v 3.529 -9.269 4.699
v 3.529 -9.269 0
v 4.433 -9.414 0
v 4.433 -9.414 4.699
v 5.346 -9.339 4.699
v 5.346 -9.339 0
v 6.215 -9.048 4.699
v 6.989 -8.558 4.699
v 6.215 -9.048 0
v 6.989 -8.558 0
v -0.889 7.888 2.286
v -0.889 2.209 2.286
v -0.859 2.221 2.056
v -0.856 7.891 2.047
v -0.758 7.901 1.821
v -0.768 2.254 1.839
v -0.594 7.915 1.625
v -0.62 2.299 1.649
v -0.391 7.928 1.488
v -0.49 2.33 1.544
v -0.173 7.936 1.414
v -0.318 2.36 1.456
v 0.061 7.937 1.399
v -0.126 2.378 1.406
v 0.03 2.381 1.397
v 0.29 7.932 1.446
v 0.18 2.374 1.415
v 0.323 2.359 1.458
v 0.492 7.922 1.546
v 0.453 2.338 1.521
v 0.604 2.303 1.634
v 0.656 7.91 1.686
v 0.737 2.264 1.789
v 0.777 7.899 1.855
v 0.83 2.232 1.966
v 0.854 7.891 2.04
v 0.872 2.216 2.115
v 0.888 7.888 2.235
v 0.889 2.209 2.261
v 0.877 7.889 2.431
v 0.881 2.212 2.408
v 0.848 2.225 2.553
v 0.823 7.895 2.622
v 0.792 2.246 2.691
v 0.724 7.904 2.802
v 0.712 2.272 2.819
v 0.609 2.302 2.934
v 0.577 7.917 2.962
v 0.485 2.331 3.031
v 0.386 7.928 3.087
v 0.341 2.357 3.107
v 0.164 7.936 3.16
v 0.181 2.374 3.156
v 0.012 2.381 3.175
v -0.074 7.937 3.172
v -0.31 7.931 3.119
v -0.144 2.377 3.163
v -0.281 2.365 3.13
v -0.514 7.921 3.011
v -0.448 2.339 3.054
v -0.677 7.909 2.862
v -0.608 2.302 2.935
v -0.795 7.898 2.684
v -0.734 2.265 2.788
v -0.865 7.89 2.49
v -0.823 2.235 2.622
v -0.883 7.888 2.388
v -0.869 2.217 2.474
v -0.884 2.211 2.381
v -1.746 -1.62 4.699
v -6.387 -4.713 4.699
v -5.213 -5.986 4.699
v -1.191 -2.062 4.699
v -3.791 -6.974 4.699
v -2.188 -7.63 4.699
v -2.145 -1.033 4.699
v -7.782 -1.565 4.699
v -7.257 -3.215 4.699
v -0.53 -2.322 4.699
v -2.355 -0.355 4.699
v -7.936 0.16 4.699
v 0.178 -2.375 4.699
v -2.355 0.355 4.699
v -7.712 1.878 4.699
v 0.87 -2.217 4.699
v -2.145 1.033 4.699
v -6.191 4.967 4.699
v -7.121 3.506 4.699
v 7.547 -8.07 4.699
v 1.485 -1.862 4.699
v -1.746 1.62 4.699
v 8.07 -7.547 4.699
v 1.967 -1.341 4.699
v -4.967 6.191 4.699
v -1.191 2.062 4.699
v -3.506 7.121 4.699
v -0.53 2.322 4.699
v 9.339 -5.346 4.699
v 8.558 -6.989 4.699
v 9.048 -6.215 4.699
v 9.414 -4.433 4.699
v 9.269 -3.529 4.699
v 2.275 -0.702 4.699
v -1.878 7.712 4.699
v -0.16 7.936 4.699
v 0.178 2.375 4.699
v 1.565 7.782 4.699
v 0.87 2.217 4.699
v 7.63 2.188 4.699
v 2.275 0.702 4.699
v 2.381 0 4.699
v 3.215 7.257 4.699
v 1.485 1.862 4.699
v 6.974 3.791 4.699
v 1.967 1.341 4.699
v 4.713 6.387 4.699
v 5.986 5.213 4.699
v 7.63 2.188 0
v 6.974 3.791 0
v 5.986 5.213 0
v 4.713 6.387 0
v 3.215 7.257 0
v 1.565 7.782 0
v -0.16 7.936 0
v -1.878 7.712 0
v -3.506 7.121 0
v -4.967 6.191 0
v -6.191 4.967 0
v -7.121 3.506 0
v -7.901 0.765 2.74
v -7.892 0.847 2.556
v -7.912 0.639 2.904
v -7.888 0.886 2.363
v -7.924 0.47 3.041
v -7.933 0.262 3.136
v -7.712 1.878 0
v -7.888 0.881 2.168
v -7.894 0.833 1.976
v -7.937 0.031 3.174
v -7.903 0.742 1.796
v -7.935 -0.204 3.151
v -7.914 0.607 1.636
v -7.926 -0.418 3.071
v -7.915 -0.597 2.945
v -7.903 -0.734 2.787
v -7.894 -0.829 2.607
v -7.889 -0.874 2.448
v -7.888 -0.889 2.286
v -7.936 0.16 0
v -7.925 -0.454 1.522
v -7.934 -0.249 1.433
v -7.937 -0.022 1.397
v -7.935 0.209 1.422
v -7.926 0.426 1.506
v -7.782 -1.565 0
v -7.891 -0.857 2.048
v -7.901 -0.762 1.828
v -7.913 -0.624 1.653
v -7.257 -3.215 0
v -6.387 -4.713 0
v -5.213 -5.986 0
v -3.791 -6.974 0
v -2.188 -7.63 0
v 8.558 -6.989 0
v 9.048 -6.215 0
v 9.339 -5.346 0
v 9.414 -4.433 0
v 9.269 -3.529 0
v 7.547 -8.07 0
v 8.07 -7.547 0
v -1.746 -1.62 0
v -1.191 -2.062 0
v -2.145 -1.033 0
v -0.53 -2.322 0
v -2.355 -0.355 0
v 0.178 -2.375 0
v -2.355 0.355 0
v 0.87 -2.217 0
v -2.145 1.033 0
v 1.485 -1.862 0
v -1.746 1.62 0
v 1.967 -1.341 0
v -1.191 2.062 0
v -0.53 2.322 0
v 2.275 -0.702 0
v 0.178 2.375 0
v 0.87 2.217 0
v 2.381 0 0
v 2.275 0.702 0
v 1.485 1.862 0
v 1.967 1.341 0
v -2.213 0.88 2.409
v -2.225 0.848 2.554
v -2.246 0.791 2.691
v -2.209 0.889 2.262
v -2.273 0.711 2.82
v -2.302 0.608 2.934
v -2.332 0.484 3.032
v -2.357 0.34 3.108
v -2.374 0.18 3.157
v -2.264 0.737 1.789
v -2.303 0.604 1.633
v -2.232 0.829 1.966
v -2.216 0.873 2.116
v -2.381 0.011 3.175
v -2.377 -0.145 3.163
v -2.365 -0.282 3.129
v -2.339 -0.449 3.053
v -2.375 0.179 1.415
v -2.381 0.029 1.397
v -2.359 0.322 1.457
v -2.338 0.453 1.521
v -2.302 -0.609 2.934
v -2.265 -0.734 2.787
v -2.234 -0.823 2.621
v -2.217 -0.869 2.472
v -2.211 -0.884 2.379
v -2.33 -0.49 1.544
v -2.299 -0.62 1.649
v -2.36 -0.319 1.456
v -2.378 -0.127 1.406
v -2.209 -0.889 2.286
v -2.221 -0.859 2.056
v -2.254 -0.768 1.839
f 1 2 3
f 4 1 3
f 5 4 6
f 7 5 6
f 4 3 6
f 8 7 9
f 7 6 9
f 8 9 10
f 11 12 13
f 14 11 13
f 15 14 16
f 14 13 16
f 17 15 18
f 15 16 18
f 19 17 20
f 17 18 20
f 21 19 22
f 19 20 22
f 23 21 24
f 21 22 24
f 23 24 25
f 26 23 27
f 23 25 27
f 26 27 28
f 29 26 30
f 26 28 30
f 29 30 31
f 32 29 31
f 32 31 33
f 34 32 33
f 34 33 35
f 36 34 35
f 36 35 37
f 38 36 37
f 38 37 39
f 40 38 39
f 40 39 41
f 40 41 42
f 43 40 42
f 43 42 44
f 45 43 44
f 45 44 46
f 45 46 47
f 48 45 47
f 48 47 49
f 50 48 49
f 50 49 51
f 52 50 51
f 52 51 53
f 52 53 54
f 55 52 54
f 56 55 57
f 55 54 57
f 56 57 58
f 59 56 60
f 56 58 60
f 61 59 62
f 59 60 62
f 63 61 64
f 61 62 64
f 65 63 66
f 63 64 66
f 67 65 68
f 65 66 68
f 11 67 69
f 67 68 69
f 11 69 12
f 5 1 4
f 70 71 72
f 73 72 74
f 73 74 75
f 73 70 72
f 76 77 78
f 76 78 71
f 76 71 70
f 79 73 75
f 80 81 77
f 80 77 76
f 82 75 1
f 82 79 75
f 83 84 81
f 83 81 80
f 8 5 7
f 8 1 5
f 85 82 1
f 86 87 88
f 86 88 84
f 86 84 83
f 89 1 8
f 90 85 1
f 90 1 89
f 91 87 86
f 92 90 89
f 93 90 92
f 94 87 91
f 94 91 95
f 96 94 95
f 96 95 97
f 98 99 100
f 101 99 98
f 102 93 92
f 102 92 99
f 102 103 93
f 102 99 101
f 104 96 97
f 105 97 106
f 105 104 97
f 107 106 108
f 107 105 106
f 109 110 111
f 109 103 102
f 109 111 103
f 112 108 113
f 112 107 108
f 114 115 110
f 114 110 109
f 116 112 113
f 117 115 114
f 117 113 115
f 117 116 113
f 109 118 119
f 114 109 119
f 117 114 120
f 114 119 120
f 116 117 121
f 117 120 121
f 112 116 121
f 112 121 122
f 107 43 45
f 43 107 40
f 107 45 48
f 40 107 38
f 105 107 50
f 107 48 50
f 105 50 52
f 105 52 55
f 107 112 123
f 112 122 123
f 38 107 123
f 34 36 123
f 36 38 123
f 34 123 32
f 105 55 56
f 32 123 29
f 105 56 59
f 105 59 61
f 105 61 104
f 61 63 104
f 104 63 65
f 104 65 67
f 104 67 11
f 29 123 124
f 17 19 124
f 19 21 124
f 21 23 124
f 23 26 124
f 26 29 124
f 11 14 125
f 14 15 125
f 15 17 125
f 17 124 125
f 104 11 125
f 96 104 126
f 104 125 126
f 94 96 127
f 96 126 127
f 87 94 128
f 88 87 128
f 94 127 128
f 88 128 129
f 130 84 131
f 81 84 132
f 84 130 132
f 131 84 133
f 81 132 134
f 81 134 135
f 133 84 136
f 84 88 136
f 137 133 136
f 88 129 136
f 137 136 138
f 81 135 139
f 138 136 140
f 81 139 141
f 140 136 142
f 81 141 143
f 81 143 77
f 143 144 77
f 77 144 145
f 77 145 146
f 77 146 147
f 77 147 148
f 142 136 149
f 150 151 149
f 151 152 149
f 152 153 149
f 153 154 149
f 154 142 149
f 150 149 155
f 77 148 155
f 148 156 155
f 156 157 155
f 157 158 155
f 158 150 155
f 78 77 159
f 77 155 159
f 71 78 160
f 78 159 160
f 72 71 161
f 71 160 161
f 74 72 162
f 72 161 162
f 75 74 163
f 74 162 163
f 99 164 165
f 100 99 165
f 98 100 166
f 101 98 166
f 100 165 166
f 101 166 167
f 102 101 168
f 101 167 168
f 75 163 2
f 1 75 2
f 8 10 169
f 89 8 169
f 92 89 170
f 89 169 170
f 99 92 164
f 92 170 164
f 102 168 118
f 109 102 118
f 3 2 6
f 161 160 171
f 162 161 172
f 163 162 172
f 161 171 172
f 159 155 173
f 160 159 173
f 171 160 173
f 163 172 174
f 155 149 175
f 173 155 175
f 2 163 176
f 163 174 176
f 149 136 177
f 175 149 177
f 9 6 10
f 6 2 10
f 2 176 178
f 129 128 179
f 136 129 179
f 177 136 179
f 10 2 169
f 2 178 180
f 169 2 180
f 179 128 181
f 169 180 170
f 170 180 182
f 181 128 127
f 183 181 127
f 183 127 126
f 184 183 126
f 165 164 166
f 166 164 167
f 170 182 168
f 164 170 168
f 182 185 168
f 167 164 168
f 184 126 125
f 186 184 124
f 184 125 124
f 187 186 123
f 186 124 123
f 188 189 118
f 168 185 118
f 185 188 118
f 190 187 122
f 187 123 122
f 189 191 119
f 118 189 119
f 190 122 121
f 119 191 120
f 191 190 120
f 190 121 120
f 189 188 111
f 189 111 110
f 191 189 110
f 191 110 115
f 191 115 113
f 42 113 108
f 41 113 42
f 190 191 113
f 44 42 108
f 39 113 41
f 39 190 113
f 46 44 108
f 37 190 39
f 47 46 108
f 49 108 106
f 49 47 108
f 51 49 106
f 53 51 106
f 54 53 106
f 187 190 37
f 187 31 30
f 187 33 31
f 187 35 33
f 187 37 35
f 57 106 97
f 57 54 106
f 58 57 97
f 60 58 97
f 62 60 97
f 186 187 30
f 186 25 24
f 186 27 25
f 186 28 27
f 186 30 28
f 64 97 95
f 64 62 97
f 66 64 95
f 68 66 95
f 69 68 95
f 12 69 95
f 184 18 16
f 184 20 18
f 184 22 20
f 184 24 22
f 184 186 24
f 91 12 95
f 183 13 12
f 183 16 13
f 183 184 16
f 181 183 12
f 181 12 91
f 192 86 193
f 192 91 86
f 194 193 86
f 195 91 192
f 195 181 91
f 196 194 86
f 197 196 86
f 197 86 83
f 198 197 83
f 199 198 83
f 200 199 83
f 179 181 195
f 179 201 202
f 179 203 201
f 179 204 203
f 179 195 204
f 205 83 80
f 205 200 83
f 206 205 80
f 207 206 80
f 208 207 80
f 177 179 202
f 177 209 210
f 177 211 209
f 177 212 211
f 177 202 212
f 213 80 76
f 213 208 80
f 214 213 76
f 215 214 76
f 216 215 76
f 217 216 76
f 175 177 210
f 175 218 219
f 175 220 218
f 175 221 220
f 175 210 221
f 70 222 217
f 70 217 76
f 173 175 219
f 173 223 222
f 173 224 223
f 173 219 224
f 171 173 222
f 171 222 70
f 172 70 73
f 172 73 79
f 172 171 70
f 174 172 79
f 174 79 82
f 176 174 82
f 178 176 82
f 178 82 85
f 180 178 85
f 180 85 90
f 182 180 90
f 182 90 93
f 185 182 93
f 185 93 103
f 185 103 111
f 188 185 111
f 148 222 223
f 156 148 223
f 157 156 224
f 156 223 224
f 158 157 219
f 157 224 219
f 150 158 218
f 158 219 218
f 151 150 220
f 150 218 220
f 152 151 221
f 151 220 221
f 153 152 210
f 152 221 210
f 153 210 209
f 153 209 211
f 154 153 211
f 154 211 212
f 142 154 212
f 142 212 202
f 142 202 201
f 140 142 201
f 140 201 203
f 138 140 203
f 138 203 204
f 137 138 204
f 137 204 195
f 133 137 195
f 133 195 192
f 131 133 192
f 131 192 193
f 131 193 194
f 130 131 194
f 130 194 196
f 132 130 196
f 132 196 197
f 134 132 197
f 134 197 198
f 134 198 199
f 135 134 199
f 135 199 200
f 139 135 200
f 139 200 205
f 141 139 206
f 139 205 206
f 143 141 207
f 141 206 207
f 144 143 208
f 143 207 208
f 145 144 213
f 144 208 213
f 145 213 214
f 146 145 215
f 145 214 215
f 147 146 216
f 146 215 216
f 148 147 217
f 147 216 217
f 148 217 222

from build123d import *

# Parameters (mm, degrees)
F0_R     = 2.38125
F1_DEPTH = 4.699
F4_D     = 1.778
F4_DEPTH = 8.4790642857
F4_START = 0.3420412
F4_TIP   = 0.5341650903
F7_D     = 1.778
F7_DEPTH = 8.4836
F7_START = 1.0024412
F7_TIP   = 0.5341650903


with BuildPart() as f1:
    # F0 (on Top) → F1 (new body)
    with BuildSketch(Plane.XY):
        with BuildLine():
            Line((9.2692313585, -3.5287562996), (7.6300147115, 2.1878715118))
            ThreePointArc((7.6300147115, 2.1878715118), (-5.6126600757, 5.6126600757), (-2.1878715118, -7.6300147115))
            Line((-2.1878715118, -7.6300147115), (3.5287562996, -9.2692313585))
            ThreePointArc((3.5287562996, -9.2692313585), (5.346264103, -9.3387548259), (6.9889002175, -8.5577844533))
            ThreePointArc((6.9889002175, -8.5577844533), (7.8128228253, -7.8128228253), (8.5577844533, -6.9889002175))
            ThreePointArc((8.5577844533, -6.9889002175), (9.3387548259, -5.346264103), (9.2692313585, -3.5287562996))
        make_face()
        Circle(F0_R, mode=Mode.SUBTRACT)
    extrude(amount=F1_DEPTH)

    # F4
    # its depths count from where the whole tool has entered the part; down to there all is cleared
    with Locations(Plane(origin=(-8.2296, 0, 0), x_dir=(0, 1, 0), z_dir=(-1, 0, 0)).offset(-F4_START)):
        with Locations((0, -2.286)):
            Hole(F4_D / 2, depth=F4_DEPTH)
            with Locations((0, 0, -(F4_DEPTH + F4_TIP / 2))):  # 118° drill point
                Cone(0, F4_D / 2, F4_TIP, mode=Mode.SUBTRACT)

    # F7
    # its depths count from where the whole tool has entered the part; down to there all is cleared
    with Locations(Plane(origin=(0, 8.89, 0), x_dir=(1, 0, 0), z_dir=(0, 1, 0)).offset(-F7_START)):
        with Locations((0, -2.286)):
            Hole(F7_D / 2, depth=F7_DEPTH)
            with Locations((0, 0, -(F7_DEPTH + F7_TIP / 2))):  # 118° drill point
                Cone(0, F7_D / 2, F7_TIP, mode=Mode.SUBTRACT)


solid = f1.part
